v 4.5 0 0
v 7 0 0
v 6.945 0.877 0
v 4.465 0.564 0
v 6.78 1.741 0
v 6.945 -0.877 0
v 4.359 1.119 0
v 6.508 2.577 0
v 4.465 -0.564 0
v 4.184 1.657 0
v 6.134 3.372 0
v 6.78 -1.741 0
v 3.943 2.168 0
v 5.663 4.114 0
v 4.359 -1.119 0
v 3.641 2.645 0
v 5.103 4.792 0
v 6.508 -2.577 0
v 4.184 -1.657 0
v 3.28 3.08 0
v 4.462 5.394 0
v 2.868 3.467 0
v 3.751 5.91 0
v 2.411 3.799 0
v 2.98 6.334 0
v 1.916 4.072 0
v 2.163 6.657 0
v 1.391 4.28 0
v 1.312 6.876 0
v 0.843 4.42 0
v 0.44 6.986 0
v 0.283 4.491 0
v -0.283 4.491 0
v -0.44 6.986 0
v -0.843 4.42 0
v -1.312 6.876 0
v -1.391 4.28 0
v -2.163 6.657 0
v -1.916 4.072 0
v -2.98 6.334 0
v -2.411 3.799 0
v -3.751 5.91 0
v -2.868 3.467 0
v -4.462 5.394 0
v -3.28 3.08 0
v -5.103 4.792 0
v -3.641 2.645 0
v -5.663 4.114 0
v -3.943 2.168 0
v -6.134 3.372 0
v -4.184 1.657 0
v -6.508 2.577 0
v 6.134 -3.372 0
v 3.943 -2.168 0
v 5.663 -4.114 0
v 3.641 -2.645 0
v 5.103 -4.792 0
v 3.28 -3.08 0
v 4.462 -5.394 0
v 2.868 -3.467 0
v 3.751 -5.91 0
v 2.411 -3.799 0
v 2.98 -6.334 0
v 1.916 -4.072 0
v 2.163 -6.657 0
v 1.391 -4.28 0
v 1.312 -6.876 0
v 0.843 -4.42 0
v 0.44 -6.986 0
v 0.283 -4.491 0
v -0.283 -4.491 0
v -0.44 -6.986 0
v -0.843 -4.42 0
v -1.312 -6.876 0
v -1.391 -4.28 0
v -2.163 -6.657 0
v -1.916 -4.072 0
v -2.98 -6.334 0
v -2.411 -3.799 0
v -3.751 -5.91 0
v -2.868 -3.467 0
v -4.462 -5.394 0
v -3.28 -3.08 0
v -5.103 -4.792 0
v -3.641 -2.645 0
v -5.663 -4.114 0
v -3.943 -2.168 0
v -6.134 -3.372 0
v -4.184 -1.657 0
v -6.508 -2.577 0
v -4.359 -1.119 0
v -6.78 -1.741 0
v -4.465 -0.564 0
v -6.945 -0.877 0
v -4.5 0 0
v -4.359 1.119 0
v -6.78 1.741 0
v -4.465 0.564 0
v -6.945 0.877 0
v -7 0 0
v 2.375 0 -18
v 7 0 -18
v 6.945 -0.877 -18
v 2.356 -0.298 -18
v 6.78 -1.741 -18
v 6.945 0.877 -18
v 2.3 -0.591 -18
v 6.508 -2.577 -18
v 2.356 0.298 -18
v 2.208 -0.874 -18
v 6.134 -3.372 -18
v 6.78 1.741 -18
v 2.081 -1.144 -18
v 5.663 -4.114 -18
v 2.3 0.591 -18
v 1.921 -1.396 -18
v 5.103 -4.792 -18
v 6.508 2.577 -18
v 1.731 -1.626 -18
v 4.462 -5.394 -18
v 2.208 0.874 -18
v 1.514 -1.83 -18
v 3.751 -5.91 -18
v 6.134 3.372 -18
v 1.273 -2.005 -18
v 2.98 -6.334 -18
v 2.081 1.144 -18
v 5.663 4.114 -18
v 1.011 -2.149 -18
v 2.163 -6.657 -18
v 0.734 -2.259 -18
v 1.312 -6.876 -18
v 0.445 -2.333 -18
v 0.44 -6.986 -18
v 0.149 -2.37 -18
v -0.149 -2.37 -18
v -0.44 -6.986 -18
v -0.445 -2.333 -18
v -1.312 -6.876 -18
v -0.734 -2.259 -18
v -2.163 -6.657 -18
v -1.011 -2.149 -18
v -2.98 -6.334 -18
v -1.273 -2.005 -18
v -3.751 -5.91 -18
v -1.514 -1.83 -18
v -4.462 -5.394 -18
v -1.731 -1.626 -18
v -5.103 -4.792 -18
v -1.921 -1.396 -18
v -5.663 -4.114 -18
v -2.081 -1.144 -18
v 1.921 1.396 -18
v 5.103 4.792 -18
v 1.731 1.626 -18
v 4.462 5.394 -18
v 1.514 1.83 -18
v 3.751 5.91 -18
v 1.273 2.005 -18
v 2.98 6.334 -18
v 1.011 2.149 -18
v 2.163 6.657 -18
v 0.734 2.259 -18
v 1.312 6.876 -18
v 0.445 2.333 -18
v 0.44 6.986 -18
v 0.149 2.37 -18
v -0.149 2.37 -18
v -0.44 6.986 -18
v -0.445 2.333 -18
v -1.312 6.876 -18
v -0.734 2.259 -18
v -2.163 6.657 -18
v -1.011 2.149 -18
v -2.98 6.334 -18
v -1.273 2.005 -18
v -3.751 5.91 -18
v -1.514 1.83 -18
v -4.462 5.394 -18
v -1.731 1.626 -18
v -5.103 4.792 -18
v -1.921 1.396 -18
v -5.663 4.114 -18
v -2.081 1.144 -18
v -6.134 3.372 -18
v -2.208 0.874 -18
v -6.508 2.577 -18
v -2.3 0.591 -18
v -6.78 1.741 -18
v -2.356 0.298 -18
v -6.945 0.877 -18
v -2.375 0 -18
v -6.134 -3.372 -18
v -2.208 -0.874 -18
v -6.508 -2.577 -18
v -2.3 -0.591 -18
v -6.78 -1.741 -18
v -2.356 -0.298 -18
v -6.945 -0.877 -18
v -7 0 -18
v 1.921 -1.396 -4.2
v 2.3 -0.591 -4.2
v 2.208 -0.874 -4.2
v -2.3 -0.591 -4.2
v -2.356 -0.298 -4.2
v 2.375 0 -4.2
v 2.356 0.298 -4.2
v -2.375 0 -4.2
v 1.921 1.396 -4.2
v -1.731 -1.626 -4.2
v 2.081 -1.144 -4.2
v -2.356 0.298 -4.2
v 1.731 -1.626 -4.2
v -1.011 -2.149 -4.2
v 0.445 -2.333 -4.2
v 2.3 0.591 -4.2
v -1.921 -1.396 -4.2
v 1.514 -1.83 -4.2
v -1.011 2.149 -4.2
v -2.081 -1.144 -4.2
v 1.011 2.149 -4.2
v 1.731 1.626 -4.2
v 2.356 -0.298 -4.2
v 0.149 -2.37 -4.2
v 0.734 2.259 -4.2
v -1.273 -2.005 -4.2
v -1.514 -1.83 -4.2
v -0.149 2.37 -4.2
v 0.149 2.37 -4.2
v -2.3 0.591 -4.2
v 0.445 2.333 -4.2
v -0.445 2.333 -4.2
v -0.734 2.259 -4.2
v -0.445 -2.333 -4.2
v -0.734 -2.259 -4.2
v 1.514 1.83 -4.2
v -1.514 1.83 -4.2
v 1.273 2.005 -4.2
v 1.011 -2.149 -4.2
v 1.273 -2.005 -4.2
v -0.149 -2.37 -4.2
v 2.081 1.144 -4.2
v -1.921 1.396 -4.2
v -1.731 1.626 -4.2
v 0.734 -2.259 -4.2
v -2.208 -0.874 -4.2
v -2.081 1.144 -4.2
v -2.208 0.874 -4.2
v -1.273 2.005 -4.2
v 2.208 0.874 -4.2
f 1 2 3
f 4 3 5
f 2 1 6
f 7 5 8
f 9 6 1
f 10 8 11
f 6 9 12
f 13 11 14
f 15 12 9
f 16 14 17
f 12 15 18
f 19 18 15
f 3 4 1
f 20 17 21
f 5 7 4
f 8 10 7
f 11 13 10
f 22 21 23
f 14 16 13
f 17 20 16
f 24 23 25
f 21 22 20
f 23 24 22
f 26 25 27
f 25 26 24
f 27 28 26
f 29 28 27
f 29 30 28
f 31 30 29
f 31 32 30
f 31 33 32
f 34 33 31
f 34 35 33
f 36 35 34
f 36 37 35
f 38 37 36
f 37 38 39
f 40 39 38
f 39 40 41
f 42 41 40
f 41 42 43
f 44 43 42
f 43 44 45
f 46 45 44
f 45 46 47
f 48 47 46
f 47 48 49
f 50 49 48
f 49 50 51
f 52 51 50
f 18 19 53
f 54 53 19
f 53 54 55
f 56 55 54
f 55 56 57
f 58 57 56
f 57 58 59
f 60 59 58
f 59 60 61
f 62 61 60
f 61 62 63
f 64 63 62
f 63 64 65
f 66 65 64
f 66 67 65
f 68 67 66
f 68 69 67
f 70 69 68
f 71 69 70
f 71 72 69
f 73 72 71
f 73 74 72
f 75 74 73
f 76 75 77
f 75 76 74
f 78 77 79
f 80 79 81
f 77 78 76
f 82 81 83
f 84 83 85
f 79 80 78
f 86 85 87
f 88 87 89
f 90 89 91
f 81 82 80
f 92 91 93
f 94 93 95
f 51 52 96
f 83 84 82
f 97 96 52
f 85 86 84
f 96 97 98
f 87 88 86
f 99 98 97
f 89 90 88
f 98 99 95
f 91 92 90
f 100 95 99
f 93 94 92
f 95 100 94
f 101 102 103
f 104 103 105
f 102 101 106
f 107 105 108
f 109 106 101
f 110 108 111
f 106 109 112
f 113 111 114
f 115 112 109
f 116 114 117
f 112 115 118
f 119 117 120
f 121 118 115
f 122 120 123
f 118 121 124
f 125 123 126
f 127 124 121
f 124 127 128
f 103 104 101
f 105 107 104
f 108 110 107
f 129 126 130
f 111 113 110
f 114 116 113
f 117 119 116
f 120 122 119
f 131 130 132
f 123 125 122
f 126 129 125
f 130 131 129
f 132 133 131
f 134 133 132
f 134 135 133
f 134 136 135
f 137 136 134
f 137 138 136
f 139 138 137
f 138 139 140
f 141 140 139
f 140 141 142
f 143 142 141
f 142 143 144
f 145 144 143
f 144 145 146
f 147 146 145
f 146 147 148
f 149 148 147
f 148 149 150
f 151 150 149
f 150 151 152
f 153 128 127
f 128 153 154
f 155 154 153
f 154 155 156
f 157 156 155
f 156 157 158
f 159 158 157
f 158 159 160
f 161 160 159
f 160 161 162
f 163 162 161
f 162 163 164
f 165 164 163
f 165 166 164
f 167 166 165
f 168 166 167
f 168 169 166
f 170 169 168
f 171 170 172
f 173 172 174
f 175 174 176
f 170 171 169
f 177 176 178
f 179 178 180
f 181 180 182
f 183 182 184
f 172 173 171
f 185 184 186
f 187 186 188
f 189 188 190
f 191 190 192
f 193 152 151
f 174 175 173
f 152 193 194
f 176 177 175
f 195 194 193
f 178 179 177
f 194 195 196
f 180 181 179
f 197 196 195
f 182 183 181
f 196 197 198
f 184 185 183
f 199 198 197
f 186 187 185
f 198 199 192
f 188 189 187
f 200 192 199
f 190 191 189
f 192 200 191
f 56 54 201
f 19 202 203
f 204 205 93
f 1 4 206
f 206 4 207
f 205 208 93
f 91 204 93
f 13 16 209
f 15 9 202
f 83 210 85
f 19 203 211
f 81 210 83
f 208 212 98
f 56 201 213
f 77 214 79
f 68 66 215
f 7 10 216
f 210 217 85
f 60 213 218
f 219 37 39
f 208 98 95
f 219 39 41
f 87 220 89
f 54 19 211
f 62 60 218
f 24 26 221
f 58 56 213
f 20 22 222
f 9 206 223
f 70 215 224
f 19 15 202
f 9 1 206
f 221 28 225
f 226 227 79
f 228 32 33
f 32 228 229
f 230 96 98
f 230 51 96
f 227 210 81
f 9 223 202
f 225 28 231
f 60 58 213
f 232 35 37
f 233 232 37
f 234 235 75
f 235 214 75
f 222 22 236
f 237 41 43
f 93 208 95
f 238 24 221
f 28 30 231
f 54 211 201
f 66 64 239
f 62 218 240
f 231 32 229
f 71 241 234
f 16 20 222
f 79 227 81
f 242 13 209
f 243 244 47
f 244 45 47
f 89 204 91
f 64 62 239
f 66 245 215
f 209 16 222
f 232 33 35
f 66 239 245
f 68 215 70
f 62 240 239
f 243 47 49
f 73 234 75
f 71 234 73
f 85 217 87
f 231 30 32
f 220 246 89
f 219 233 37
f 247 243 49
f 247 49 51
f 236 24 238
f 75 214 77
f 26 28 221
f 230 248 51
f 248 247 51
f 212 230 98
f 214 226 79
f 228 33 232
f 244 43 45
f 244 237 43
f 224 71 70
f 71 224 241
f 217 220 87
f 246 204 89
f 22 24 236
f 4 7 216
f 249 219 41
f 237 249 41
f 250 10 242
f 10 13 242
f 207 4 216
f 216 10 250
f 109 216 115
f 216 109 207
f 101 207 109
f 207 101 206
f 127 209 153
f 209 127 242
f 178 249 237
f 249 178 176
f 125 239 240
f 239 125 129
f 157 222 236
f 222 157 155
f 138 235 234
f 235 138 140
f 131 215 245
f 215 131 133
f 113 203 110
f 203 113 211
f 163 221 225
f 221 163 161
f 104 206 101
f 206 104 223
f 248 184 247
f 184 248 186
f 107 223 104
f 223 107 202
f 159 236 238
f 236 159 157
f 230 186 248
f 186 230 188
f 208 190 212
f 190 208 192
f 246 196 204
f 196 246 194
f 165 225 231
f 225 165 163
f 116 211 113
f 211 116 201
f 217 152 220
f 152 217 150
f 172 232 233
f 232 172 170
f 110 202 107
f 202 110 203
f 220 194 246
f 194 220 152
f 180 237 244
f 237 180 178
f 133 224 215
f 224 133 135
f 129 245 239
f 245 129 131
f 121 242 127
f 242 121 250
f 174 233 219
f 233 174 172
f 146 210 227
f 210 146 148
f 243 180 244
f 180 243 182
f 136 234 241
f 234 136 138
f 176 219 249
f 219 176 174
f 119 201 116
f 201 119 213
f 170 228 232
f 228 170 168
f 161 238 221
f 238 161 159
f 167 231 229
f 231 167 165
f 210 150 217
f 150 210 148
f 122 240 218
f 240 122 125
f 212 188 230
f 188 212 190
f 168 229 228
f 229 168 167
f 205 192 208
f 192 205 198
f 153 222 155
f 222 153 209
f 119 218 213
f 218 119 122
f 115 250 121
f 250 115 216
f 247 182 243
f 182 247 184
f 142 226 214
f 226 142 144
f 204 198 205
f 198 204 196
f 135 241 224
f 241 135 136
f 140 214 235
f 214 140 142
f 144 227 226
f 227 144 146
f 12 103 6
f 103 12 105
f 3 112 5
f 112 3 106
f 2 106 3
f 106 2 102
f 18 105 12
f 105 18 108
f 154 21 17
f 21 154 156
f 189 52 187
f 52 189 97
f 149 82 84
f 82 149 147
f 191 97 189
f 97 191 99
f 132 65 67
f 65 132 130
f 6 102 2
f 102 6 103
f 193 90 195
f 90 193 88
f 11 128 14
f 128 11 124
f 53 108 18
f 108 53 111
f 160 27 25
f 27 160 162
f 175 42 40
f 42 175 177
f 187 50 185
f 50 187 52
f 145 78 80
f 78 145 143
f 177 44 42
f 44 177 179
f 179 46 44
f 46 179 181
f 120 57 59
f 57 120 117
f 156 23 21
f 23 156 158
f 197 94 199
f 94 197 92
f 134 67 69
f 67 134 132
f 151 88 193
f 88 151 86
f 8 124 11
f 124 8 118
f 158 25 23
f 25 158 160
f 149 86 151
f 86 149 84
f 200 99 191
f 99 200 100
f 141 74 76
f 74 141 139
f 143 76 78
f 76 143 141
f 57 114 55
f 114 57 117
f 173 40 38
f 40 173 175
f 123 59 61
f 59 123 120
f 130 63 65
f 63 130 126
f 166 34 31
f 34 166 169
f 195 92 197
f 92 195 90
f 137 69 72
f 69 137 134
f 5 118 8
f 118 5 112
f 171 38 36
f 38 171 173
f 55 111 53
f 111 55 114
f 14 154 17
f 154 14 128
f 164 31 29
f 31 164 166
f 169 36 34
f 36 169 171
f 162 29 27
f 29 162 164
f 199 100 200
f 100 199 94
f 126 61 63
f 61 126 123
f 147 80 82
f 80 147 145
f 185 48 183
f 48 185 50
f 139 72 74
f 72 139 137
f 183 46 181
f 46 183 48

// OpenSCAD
$fn = 50;


difference() {
	union() {
		translate(v = [0, 0, -18.0000000000]) {
			cylinder(h = 18, r = 7.0000000000);
		}
	}
	union() {
		translate(v = [0, 0, 0]) {
			rotate(a = [0, 0, 0]) {
				difference() {
					union() {
						#translate(v = [0, 0, -18.0000000000]) {
							cylinder(h = 18, r = 2.2500000000);
						}
						#translate(v = [0, 0, -4.2000000000]) {
							cylinder(h = 4.2000000000, r1 = 2.3750000000, r2 = 4.5000000000);
						}
						#translate(v = [0, 0, -18.0000000000]) {
							cylinder(h = 18, r = 2.3750000000);
						}
						#translate(v = [0, 0, -18.0000000000]) {
							cylinder(h = 18, r = 2.2500000000);
						}
					}
					union();
				}
			}
		}
	}
}
